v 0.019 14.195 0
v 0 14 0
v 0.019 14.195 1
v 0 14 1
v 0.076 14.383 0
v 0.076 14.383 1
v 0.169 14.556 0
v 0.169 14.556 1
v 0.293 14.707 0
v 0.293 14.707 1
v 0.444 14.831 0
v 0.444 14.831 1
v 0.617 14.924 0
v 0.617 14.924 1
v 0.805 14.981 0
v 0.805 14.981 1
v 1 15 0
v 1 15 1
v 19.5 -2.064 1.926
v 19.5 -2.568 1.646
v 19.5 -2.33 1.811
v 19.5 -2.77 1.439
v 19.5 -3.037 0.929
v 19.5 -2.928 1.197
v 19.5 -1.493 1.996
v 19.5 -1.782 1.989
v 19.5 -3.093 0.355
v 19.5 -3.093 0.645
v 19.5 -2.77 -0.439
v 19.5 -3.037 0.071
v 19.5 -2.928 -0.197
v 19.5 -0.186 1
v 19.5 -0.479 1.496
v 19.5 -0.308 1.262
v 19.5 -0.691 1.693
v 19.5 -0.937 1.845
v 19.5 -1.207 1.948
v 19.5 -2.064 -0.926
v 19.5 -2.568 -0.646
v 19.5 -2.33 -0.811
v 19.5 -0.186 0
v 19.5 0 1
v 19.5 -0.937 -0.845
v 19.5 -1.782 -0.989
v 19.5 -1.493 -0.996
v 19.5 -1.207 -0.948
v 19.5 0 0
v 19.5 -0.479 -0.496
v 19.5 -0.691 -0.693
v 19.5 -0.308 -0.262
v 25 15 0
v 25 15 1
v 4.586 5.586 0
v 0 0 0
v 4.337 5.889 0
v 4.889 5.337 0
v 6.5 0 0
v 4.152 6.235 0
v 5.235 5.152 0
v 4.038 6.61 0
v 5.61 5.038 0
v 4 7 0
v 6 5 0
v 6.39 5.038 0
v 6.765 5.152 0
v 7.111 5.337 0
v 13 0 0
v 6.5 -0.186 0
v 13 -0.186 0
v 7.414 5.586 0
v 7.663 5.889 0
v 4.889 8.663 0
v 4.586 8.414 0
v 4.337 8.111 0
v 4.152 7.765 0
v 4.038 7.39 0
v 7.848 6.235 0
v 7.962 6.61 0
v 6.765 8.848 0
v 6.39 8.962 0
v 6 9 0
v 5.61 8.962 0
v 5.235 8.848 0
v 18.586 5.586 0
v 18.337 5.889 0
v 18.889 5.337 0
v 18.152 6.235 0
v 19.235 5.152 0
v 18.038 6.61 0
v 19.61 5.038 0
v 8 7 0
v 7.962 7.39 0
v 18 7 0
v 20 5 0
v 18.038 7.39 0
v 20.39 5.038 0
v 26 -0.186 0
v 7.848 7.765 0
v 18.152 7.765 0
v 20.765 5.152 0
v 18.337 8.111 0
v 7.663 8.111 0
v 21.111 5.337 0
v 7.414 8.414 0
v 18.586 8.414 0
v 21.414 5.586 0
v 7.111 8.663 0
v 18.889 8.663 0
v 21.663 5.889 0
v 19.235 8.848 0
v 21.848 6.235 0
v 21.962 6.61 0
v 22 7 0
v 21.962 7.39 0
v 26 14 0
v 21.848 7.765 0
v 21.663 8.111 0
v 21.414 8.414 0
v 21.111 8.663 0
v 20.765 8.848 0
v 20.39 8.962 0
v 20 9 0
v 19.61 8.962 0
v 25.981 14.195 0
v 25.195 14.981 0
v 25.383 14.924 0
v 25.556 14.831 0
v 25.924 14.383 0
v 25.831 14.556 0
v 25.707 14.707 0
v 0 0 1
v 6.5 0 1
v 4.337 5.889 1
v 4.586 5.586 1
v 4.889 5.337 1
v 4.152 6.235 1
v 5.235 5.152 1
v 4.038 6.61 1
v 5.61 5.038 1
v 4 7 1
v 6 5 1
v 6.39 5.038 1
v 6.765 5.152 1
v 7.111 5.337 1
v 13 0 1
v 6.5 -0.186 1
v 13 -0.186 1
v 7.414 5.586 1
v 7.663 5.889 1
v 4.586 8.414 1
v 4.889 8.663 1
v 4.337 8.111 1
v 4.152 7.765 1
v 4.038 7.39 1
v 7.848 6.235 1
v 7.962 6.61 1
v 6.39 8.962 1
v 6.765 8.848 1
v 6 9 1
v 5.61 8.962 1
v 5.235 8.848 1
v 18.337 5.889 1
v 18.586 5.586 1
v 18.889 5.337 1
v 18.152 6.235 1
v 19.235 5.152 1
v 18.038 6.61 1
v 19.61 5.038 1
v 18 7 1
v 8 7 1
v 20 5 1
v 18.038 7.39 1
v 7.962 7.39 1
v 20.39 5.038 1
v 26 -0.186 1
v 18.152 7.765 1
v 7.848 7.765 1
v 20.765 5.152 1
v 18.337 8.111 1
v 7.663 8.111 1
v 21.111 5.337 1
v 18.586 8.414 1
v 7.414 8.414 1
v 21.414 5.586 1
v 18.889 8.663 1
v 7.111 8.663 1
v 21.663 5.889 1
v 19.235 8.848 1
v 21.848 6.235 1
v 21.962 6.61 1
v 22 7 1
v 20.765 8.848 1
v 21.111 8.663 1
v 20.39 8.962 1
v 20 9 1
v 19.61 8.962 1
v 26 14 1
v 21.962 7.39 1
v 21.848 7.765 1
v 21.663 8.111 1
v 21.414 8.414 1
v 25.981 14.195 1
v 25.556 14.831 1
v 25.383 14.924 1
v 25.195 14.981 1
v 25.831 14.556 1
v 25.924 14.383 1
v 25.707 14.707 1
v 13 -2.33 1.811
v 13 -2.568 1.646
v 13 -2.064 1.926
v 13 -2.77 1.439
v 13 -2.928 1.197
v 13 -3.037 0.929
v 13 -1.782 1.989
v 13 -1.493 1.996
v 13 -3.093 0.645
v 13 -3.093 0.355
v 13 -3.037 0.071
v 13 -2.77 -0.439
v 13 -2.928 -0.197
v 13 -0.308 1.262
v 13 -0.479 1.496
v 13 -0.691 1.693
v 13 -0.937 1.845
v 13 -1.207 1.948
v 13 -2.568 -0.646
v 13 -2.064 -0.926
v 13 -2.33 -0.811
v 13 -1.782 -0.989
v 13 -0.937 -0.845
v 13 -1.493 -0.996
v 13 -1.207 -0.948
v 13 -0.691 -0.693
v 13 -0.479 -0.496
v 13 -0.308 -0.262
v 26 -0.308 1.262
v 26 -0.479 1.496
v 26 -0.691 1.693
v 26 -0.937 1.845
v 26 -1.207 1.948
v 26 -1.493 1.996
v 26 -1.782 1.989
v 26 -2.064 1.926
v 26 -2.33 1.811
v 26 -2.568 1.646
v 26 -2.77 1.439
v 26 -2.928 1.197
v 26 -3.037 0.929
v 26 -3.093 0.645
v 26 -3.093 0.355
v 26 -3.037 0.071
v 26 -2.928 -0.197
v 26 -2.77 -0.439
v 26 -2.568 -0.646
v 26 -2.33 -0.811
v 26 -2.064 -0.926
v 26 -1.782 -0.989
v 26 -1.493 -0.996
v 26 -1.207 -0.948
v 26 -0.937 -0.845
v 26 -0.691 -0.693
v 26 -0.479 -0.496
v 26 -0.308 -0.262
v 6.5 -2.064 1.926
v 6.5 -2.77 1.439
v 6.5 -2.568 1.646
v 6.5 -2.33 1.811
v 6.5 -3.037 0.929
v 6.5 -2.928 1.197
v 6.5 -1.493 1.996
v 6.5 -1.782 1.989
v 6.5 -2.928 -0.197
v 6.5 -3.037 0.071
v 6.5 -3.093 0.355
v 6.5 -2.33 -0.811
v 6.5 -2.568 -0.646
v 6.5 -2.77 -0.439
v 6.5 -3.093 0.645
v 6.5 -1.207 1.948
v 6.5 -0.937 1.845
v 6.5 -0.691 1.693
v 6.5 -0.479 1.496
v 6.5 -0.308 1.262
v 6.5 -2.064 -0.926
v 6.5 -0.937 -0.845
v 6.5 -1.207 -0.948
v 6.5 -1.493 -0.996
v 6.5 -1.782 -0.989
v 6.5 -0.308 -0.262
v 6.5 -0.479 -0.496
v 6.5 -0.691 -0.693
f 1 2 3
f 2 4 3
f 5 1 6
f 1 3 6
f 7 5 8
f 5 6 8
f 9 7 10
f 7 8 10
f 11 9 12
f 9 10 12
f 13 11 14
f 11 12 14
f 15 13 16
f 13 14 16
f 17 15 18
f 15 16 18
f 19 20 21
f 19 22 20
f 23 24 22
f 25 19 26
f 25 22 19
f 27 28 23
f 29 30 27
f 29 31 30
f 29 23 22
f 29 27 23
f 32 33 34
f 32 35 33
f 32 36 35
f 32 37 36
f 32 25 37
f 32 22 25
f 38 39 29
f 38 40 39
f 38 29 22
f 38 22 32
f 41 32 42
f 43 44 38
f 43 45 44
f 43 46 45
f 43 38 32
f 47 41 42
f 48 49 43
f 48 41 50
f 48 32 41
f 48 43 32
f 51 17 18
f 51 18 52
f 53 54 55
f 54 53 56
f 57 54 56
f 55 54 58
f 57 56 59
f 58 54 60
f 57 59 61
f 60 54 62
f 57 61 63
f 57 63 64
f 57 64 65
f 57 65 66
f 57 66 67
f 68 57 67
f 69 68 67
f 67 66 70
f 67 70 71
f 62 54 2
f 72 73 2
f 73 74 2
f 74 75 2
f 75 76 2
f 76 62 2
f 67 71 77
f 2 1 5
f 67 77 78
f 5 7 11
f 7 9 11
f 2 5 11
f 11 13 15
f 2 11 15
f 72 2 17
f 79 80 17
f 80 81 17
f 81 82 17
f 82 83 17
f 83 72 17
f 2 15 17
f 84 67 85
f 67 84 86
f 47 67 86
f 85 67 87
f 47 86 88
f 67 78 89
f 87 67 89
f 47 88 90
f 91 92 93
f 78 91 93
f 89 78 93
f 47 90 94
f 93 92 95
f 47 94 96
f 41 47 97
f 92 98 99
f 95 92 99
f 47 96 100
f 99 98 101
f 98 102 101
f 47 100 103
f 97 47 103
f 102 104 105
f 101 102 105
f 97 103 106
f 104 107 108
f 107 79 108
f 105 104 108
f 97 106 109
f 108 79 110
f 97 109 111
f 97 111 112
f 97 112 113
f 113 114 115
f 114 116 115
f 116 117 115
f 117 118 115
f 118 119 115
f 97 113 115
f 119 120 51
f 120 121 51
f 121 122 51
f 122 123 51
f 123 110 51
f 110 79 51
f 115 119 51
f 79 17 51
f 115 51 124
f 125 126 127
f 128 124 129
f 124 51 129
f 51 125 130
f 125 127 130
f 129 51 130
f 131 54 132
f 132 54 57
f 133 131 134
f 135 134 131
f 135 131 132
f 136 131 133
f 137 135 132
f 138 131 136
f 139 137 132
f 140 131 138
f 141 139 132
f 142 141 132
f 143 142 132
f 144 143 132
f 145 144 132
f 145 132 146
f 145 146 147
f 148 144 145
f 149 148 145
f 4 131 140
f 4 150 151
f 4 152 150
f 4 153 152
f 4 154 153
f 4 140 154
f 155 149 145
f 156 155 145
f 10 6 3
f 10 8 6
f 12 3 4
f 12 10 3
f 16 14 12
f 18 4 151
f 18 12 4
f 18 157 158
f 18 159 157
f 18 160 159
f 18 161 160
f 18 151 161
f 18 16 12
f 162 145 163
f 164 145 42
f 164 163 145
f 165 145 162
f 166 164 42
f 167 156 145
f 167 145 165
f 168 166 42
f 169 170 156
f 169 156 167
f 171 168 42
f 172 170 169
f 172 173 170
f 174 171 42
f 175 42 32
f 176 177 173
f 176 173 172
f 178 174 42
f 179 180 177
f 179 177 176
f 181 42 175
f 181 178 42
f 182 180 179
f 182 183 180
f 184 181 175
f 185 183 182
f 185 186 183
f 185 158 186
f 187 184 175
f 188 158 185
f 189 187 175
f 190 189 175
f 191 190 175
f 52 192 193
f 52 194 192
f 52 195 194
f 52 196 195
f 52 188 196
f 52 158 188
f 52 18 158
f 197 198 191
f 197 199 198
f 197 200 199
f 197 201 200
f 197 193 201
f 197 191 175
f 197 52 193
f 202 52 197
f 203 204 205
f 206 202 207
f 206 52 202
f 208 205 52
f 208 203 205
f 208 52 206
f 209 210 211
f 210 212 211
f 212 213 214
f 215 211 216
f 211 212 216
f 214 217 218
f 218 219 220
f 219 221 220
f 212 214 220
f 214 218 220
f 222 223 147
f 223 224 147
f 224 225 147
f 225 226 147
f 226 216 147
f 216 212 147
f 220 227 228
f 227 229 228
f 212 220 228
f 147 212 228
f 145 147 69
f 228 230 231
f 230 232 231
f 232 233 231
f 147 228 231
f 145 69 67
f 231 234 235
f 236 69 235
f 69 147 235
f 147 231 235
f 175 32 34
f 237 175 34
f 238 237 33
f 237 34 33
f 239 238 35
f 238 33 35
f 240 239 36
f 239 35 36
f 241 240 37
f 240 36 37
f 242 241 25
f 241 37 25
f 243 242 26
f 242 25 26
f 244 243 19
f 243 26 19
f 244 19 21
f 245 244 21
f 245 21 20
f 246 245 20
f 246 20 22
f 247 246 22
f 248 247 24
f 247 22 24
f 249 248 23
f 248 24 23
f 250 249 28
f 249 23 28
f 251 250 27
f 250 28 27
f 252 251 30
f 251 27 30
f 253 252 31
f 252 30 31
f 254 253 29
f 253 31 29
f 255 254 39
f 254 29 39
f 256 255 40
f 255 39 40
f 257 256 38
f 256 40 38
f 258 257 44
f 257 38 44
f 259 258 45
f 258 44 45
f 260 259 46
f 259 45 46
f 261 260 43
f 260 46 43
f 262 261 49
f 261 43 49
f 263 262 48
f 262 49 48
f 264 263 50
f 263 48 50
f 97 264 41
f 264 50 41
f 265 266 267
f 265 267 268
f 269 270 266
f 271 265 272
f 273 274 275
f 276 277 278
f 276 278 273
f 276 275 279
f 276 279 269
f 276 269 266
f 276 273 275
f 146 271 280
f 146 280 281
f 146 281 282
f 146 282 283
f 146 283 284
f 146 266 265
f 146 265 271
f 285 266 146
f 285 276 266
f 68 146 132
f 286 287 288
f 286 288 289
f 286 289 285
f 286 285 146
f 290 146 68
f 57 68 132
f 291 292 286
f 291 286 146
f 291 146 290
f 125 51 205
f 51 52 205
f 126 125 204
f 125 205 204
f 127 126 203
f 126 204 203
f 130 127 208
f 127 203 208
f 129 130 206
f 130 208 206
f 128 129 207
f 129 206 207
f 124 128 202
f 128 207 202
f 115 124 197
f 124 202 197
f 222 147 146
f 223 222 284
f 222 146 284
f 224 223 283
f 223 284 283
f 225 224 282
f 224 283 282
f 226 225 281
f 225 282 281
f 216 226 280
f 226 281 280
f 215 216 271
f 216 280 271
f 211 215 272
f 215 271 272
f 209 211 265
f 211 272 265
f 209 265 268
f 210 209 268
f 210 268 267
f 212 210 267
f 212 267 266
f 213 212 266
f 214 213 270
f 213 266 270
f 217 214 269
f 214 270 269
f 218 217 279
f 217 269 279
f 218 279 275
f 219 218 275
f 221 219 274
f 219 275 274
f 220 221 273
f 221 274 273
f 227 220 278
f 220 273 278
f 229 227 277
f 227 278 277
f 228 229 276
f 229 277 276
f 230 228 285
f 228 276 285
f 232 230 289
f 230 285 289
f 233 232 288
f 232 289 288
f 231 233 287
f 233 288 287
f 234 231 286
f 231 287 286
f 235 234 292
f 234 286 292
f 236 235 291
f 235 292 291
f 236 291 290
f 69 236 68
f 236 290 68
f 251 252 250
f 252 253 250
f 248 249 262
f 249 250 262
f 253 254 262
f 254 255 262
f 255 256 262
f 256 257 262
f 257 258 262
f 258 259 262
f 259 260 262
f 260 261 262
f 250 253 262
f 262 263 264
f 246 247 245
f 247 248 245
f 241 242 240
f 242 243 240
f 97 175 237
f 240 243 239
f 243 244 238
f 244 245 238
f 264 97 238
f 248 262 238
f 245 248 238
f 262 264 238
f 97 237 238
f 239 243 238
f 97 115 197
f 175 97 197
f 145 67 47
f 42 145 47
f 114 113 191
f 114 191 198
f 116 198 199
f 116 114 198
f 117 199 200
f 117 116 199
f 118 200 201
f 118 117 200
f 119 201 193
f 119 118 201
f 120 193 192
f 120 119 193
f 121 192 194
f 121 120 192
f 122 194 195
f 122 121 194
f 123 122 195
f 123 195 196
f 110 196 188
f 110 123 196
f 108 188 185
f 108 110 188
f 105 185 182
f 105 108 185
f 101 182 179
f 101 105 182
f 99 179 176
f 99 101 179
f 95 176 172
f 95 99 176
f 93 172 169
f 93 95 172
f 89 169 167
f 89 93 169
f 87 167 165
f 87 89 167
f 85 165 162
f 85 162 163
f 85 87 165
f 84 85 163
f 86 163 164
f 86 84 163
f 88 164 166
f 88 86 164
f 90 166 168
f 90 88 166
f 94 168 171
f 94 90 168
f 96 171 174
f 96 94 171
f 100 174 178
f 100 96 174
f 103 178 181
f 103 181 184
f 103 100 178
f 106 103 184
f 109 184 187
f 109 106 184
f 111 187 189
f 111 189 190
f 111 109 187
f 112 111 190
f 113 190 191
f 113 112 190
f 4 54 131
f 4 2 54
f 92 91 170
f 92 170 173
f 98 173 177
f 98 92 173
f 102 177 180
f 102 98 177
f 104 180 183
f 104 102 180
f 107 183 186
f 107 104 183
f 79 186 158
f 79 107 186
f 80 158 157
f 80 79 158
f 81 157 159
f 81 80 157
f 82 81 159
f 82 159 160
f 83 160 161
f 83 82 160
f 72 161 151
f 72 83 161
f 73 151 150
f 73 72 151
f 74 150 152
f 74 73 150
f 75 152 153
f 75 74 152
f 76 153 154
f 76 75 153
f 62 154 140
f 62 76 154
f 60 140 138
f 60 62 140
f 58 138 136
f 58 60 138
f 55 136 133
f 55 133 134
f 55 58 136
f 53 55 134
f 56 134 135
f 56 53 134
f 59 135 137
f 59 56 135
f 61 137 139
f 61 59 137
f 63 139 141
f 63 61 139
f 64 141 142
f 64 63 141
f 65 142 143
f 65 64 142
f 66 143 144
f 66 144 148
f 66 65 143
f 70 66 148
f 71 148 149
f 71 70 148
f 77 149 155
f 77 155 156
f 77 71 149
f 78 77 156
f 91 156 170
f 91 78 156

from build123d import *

# Parameters (mm, degrees)
SKETCH1_W               = 26
SKETCH1_H               = 15
SKETCH1_R               = 2
BOSS_EXTRUDE1_DEPTH     = 1
FILLET1_R               = 1
SKETCH3_R               = 1.5
BOSS_EXTRUDE2_DEPTH     = 26
BOSS_EXTRUDE3_REACH     = 32.083
SKETCH6_W               = 26
SKETCH6_H               = 1
CUT_EXTRUDE1_DEPTH      = 31.083217913
CUT_EXTRUDE1_DEPTH_BACK = 31.083217913
SKETCH8_W               = 6.5
SKETCH8_H               = 3.1


with BuildPart() as part:
    # Sketch1 → Boss-Extrude1 (new body)
    with BuildSketch(Plane.XY):
        with Locations((13, 7.5)):
            Rectangle(SKETCH1_W, SKETCH1_H)
        with Locations((6, 7)):
            Circle(SKETCH1_R, mode=Mode.SUBTRACT)
        with Locations((20, 7)):
            Circle(SKETCH1_R, mode=Mode.SUBTRACT)
    extrude(amount=BOSS_EXTRUDE1_DEPTH)

    # Fillet1
    fillet1_edges = [part.edges().sort_by_distance(p)[0] for p in [
        (0, 15, 0.5),
        (26, 15, 0.5),
    ]]
    fillet(fillet1_edges, radius=FILLET1_R)


with BuildPart() as body_2:
    # Sketch3 → Boss-Extrude2 (new body)
    with BuildSketch(Plane(origin=(0, 0, 0), x_dir=(0, 0, -1), z_dir=(1, 0, 0))):
        with Locations(Location((-0.5, -1.6, 0), (0, 0, 180))):
            Circle(SKETCH3_R)
    extrude(amount=BOSS_EXTRUDE2_DEPTH)

    # Sketch6 → Boss-Extrude3 (add, up to next)
    with BuildSketch(Plane.XZ, mode=Mode.PRIVATE) as boss_extrude3_sk1:
        with Locations((13, 0.5)):
            Rectangle(SKETCH6_W, SKETCH6_H)
    boss_extrude3_tool1 = extrude(boss_extrude3_sk1.sketch, amount=BOSS_EXTRUDE3_REACH, mode=Mode.PRIVATE) - body_2.part

    add(part.part)  # Boss-Extrude3 merges part
    add(boss_extrude3_tool1.solids().sort_by_distance((13, 0, 0.5))[0])

    # Sketch8 → Cut-Extrude1 (cut, two sides: drawn at the far end of the back side and taken through both)
    with BuildSketch(Plane.XY.offset(-CUT_EXTRUDE1_DEPTH_BACK)):
        with Locations((3.25, -1.55)):
            Rectangle(SKETCH8_W, SKETCH8_H)
        with Locations((16.25, -1.55)):
            Rectangle(SKETCH8_W, SKETCH8_H)
    extrude(amount=CUT_EXTRUDE1_DEPTH + CUT_EXTRUDE1_DEPTH_BACK, mode=Mode.SUBTRACT)


solid = body_2.part
